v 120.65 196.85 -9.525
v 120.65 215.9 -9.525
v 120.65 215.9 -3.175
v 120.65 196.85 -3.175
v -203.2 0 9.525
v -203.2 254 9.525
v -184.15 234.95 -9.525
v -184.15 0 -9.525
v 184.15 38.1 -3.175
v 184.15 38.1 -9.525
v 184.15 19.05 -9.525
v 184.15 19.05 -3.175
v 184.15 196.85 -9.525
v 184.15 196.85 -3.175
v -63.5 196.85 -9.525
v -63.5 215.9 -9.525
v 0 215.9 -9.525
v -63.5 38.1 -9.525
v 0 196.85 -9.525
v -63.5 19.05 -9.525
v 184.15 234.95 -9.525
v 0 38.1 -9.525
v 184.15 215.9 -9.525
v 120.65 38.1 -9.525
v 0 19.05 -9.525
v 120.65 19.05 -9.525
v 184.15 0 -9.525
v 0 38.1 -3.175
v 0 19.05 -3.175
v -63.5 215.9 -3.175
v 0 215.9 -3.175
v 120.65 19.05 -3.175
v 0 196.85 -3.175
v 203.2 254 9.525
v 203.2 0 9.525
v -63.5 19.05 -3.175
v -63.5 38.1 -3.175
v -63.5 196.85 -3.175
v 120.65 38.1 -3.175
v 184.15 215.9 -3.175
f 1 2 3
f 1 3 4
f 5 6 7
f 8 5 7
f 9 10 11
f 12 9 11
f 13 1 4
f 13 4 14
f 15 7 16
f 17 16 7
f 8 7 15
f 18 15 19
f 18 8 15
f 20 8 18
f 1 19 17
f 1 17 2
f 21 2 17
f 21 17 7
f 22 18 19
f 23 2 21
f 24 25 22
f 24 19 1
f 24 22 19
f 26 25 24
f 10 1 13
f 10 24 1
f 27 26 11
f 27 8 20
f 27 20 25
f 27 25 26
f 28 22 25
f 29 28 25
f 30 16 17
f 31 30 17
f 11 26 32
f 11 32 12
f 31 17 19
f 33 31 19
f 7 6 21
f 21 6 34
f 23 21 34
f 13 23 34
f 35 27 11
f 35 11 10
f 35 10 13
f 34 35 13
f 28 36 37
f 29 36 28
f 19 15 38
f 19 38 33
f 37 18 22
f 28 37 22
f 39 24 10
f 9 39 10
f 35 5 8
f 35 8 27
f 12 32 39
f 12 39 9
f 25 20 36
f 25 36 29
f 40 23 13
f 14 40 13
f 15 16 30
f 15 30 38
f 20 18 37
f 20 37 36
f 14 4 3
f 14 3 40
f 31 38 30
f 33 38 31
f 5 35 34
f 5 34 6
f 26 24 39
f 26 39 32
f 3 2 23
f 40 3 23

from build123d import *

# Parameters (mm, degrees)
F1_DEPTH = 254
F2_SIZE  = 19.04999
F3_W     = 63.5
F3_H     = 19.05
F4_DEPTH = 6.35


# Not quite as in the source:
# - a fillet or chamfer is up to 0.001 mm smaller than in the source, because OpenCascade refuses the exact size


with BuildPart() as f1:
    # F0 (on Front) → F1 (new body)
    with BuildSketch(Plane.XZ):
        Polygon((203.2, 9.525), (-203.2, 9.525), (-184.15, -9.525), (184.15, -9.525), align=None)
    extrude(amount=-F1_DEPTH)

    # F2 (size 19.05 in the source; OpenCascade refuses exactly that, so slightly less here)
    f2_edges = [f1.edges().sort_by_distance(p)[0] for p in [
        (0, 254, -9.525),
    ]]
    chamfer(f2_edges, length=F2_SIZE)

    # F3 (on face) → F4 (cut)
    with BuildSketch(Plane(origin=(0, 0, -9.525), x_dir=(1, 0, 0), z_dir=(0, 0, -1))):
        with Locations((-31.75, -206.375)):
            Rectangle(F3_W, F3_H)
        with Locations((-31.75, -28.575)):
            Rectangle(F3_W, F3_H)
        with Locations((152.4, -28.575)):
            Rectangle(F3_W, F3_H)
        with Locations((152.4, -206.375)):
            Rectangle(F3_W, F3_H)
    extrude(amount=-F4_DEPTH, mode=Mode.SUBTRACT)


solid = f1.part
